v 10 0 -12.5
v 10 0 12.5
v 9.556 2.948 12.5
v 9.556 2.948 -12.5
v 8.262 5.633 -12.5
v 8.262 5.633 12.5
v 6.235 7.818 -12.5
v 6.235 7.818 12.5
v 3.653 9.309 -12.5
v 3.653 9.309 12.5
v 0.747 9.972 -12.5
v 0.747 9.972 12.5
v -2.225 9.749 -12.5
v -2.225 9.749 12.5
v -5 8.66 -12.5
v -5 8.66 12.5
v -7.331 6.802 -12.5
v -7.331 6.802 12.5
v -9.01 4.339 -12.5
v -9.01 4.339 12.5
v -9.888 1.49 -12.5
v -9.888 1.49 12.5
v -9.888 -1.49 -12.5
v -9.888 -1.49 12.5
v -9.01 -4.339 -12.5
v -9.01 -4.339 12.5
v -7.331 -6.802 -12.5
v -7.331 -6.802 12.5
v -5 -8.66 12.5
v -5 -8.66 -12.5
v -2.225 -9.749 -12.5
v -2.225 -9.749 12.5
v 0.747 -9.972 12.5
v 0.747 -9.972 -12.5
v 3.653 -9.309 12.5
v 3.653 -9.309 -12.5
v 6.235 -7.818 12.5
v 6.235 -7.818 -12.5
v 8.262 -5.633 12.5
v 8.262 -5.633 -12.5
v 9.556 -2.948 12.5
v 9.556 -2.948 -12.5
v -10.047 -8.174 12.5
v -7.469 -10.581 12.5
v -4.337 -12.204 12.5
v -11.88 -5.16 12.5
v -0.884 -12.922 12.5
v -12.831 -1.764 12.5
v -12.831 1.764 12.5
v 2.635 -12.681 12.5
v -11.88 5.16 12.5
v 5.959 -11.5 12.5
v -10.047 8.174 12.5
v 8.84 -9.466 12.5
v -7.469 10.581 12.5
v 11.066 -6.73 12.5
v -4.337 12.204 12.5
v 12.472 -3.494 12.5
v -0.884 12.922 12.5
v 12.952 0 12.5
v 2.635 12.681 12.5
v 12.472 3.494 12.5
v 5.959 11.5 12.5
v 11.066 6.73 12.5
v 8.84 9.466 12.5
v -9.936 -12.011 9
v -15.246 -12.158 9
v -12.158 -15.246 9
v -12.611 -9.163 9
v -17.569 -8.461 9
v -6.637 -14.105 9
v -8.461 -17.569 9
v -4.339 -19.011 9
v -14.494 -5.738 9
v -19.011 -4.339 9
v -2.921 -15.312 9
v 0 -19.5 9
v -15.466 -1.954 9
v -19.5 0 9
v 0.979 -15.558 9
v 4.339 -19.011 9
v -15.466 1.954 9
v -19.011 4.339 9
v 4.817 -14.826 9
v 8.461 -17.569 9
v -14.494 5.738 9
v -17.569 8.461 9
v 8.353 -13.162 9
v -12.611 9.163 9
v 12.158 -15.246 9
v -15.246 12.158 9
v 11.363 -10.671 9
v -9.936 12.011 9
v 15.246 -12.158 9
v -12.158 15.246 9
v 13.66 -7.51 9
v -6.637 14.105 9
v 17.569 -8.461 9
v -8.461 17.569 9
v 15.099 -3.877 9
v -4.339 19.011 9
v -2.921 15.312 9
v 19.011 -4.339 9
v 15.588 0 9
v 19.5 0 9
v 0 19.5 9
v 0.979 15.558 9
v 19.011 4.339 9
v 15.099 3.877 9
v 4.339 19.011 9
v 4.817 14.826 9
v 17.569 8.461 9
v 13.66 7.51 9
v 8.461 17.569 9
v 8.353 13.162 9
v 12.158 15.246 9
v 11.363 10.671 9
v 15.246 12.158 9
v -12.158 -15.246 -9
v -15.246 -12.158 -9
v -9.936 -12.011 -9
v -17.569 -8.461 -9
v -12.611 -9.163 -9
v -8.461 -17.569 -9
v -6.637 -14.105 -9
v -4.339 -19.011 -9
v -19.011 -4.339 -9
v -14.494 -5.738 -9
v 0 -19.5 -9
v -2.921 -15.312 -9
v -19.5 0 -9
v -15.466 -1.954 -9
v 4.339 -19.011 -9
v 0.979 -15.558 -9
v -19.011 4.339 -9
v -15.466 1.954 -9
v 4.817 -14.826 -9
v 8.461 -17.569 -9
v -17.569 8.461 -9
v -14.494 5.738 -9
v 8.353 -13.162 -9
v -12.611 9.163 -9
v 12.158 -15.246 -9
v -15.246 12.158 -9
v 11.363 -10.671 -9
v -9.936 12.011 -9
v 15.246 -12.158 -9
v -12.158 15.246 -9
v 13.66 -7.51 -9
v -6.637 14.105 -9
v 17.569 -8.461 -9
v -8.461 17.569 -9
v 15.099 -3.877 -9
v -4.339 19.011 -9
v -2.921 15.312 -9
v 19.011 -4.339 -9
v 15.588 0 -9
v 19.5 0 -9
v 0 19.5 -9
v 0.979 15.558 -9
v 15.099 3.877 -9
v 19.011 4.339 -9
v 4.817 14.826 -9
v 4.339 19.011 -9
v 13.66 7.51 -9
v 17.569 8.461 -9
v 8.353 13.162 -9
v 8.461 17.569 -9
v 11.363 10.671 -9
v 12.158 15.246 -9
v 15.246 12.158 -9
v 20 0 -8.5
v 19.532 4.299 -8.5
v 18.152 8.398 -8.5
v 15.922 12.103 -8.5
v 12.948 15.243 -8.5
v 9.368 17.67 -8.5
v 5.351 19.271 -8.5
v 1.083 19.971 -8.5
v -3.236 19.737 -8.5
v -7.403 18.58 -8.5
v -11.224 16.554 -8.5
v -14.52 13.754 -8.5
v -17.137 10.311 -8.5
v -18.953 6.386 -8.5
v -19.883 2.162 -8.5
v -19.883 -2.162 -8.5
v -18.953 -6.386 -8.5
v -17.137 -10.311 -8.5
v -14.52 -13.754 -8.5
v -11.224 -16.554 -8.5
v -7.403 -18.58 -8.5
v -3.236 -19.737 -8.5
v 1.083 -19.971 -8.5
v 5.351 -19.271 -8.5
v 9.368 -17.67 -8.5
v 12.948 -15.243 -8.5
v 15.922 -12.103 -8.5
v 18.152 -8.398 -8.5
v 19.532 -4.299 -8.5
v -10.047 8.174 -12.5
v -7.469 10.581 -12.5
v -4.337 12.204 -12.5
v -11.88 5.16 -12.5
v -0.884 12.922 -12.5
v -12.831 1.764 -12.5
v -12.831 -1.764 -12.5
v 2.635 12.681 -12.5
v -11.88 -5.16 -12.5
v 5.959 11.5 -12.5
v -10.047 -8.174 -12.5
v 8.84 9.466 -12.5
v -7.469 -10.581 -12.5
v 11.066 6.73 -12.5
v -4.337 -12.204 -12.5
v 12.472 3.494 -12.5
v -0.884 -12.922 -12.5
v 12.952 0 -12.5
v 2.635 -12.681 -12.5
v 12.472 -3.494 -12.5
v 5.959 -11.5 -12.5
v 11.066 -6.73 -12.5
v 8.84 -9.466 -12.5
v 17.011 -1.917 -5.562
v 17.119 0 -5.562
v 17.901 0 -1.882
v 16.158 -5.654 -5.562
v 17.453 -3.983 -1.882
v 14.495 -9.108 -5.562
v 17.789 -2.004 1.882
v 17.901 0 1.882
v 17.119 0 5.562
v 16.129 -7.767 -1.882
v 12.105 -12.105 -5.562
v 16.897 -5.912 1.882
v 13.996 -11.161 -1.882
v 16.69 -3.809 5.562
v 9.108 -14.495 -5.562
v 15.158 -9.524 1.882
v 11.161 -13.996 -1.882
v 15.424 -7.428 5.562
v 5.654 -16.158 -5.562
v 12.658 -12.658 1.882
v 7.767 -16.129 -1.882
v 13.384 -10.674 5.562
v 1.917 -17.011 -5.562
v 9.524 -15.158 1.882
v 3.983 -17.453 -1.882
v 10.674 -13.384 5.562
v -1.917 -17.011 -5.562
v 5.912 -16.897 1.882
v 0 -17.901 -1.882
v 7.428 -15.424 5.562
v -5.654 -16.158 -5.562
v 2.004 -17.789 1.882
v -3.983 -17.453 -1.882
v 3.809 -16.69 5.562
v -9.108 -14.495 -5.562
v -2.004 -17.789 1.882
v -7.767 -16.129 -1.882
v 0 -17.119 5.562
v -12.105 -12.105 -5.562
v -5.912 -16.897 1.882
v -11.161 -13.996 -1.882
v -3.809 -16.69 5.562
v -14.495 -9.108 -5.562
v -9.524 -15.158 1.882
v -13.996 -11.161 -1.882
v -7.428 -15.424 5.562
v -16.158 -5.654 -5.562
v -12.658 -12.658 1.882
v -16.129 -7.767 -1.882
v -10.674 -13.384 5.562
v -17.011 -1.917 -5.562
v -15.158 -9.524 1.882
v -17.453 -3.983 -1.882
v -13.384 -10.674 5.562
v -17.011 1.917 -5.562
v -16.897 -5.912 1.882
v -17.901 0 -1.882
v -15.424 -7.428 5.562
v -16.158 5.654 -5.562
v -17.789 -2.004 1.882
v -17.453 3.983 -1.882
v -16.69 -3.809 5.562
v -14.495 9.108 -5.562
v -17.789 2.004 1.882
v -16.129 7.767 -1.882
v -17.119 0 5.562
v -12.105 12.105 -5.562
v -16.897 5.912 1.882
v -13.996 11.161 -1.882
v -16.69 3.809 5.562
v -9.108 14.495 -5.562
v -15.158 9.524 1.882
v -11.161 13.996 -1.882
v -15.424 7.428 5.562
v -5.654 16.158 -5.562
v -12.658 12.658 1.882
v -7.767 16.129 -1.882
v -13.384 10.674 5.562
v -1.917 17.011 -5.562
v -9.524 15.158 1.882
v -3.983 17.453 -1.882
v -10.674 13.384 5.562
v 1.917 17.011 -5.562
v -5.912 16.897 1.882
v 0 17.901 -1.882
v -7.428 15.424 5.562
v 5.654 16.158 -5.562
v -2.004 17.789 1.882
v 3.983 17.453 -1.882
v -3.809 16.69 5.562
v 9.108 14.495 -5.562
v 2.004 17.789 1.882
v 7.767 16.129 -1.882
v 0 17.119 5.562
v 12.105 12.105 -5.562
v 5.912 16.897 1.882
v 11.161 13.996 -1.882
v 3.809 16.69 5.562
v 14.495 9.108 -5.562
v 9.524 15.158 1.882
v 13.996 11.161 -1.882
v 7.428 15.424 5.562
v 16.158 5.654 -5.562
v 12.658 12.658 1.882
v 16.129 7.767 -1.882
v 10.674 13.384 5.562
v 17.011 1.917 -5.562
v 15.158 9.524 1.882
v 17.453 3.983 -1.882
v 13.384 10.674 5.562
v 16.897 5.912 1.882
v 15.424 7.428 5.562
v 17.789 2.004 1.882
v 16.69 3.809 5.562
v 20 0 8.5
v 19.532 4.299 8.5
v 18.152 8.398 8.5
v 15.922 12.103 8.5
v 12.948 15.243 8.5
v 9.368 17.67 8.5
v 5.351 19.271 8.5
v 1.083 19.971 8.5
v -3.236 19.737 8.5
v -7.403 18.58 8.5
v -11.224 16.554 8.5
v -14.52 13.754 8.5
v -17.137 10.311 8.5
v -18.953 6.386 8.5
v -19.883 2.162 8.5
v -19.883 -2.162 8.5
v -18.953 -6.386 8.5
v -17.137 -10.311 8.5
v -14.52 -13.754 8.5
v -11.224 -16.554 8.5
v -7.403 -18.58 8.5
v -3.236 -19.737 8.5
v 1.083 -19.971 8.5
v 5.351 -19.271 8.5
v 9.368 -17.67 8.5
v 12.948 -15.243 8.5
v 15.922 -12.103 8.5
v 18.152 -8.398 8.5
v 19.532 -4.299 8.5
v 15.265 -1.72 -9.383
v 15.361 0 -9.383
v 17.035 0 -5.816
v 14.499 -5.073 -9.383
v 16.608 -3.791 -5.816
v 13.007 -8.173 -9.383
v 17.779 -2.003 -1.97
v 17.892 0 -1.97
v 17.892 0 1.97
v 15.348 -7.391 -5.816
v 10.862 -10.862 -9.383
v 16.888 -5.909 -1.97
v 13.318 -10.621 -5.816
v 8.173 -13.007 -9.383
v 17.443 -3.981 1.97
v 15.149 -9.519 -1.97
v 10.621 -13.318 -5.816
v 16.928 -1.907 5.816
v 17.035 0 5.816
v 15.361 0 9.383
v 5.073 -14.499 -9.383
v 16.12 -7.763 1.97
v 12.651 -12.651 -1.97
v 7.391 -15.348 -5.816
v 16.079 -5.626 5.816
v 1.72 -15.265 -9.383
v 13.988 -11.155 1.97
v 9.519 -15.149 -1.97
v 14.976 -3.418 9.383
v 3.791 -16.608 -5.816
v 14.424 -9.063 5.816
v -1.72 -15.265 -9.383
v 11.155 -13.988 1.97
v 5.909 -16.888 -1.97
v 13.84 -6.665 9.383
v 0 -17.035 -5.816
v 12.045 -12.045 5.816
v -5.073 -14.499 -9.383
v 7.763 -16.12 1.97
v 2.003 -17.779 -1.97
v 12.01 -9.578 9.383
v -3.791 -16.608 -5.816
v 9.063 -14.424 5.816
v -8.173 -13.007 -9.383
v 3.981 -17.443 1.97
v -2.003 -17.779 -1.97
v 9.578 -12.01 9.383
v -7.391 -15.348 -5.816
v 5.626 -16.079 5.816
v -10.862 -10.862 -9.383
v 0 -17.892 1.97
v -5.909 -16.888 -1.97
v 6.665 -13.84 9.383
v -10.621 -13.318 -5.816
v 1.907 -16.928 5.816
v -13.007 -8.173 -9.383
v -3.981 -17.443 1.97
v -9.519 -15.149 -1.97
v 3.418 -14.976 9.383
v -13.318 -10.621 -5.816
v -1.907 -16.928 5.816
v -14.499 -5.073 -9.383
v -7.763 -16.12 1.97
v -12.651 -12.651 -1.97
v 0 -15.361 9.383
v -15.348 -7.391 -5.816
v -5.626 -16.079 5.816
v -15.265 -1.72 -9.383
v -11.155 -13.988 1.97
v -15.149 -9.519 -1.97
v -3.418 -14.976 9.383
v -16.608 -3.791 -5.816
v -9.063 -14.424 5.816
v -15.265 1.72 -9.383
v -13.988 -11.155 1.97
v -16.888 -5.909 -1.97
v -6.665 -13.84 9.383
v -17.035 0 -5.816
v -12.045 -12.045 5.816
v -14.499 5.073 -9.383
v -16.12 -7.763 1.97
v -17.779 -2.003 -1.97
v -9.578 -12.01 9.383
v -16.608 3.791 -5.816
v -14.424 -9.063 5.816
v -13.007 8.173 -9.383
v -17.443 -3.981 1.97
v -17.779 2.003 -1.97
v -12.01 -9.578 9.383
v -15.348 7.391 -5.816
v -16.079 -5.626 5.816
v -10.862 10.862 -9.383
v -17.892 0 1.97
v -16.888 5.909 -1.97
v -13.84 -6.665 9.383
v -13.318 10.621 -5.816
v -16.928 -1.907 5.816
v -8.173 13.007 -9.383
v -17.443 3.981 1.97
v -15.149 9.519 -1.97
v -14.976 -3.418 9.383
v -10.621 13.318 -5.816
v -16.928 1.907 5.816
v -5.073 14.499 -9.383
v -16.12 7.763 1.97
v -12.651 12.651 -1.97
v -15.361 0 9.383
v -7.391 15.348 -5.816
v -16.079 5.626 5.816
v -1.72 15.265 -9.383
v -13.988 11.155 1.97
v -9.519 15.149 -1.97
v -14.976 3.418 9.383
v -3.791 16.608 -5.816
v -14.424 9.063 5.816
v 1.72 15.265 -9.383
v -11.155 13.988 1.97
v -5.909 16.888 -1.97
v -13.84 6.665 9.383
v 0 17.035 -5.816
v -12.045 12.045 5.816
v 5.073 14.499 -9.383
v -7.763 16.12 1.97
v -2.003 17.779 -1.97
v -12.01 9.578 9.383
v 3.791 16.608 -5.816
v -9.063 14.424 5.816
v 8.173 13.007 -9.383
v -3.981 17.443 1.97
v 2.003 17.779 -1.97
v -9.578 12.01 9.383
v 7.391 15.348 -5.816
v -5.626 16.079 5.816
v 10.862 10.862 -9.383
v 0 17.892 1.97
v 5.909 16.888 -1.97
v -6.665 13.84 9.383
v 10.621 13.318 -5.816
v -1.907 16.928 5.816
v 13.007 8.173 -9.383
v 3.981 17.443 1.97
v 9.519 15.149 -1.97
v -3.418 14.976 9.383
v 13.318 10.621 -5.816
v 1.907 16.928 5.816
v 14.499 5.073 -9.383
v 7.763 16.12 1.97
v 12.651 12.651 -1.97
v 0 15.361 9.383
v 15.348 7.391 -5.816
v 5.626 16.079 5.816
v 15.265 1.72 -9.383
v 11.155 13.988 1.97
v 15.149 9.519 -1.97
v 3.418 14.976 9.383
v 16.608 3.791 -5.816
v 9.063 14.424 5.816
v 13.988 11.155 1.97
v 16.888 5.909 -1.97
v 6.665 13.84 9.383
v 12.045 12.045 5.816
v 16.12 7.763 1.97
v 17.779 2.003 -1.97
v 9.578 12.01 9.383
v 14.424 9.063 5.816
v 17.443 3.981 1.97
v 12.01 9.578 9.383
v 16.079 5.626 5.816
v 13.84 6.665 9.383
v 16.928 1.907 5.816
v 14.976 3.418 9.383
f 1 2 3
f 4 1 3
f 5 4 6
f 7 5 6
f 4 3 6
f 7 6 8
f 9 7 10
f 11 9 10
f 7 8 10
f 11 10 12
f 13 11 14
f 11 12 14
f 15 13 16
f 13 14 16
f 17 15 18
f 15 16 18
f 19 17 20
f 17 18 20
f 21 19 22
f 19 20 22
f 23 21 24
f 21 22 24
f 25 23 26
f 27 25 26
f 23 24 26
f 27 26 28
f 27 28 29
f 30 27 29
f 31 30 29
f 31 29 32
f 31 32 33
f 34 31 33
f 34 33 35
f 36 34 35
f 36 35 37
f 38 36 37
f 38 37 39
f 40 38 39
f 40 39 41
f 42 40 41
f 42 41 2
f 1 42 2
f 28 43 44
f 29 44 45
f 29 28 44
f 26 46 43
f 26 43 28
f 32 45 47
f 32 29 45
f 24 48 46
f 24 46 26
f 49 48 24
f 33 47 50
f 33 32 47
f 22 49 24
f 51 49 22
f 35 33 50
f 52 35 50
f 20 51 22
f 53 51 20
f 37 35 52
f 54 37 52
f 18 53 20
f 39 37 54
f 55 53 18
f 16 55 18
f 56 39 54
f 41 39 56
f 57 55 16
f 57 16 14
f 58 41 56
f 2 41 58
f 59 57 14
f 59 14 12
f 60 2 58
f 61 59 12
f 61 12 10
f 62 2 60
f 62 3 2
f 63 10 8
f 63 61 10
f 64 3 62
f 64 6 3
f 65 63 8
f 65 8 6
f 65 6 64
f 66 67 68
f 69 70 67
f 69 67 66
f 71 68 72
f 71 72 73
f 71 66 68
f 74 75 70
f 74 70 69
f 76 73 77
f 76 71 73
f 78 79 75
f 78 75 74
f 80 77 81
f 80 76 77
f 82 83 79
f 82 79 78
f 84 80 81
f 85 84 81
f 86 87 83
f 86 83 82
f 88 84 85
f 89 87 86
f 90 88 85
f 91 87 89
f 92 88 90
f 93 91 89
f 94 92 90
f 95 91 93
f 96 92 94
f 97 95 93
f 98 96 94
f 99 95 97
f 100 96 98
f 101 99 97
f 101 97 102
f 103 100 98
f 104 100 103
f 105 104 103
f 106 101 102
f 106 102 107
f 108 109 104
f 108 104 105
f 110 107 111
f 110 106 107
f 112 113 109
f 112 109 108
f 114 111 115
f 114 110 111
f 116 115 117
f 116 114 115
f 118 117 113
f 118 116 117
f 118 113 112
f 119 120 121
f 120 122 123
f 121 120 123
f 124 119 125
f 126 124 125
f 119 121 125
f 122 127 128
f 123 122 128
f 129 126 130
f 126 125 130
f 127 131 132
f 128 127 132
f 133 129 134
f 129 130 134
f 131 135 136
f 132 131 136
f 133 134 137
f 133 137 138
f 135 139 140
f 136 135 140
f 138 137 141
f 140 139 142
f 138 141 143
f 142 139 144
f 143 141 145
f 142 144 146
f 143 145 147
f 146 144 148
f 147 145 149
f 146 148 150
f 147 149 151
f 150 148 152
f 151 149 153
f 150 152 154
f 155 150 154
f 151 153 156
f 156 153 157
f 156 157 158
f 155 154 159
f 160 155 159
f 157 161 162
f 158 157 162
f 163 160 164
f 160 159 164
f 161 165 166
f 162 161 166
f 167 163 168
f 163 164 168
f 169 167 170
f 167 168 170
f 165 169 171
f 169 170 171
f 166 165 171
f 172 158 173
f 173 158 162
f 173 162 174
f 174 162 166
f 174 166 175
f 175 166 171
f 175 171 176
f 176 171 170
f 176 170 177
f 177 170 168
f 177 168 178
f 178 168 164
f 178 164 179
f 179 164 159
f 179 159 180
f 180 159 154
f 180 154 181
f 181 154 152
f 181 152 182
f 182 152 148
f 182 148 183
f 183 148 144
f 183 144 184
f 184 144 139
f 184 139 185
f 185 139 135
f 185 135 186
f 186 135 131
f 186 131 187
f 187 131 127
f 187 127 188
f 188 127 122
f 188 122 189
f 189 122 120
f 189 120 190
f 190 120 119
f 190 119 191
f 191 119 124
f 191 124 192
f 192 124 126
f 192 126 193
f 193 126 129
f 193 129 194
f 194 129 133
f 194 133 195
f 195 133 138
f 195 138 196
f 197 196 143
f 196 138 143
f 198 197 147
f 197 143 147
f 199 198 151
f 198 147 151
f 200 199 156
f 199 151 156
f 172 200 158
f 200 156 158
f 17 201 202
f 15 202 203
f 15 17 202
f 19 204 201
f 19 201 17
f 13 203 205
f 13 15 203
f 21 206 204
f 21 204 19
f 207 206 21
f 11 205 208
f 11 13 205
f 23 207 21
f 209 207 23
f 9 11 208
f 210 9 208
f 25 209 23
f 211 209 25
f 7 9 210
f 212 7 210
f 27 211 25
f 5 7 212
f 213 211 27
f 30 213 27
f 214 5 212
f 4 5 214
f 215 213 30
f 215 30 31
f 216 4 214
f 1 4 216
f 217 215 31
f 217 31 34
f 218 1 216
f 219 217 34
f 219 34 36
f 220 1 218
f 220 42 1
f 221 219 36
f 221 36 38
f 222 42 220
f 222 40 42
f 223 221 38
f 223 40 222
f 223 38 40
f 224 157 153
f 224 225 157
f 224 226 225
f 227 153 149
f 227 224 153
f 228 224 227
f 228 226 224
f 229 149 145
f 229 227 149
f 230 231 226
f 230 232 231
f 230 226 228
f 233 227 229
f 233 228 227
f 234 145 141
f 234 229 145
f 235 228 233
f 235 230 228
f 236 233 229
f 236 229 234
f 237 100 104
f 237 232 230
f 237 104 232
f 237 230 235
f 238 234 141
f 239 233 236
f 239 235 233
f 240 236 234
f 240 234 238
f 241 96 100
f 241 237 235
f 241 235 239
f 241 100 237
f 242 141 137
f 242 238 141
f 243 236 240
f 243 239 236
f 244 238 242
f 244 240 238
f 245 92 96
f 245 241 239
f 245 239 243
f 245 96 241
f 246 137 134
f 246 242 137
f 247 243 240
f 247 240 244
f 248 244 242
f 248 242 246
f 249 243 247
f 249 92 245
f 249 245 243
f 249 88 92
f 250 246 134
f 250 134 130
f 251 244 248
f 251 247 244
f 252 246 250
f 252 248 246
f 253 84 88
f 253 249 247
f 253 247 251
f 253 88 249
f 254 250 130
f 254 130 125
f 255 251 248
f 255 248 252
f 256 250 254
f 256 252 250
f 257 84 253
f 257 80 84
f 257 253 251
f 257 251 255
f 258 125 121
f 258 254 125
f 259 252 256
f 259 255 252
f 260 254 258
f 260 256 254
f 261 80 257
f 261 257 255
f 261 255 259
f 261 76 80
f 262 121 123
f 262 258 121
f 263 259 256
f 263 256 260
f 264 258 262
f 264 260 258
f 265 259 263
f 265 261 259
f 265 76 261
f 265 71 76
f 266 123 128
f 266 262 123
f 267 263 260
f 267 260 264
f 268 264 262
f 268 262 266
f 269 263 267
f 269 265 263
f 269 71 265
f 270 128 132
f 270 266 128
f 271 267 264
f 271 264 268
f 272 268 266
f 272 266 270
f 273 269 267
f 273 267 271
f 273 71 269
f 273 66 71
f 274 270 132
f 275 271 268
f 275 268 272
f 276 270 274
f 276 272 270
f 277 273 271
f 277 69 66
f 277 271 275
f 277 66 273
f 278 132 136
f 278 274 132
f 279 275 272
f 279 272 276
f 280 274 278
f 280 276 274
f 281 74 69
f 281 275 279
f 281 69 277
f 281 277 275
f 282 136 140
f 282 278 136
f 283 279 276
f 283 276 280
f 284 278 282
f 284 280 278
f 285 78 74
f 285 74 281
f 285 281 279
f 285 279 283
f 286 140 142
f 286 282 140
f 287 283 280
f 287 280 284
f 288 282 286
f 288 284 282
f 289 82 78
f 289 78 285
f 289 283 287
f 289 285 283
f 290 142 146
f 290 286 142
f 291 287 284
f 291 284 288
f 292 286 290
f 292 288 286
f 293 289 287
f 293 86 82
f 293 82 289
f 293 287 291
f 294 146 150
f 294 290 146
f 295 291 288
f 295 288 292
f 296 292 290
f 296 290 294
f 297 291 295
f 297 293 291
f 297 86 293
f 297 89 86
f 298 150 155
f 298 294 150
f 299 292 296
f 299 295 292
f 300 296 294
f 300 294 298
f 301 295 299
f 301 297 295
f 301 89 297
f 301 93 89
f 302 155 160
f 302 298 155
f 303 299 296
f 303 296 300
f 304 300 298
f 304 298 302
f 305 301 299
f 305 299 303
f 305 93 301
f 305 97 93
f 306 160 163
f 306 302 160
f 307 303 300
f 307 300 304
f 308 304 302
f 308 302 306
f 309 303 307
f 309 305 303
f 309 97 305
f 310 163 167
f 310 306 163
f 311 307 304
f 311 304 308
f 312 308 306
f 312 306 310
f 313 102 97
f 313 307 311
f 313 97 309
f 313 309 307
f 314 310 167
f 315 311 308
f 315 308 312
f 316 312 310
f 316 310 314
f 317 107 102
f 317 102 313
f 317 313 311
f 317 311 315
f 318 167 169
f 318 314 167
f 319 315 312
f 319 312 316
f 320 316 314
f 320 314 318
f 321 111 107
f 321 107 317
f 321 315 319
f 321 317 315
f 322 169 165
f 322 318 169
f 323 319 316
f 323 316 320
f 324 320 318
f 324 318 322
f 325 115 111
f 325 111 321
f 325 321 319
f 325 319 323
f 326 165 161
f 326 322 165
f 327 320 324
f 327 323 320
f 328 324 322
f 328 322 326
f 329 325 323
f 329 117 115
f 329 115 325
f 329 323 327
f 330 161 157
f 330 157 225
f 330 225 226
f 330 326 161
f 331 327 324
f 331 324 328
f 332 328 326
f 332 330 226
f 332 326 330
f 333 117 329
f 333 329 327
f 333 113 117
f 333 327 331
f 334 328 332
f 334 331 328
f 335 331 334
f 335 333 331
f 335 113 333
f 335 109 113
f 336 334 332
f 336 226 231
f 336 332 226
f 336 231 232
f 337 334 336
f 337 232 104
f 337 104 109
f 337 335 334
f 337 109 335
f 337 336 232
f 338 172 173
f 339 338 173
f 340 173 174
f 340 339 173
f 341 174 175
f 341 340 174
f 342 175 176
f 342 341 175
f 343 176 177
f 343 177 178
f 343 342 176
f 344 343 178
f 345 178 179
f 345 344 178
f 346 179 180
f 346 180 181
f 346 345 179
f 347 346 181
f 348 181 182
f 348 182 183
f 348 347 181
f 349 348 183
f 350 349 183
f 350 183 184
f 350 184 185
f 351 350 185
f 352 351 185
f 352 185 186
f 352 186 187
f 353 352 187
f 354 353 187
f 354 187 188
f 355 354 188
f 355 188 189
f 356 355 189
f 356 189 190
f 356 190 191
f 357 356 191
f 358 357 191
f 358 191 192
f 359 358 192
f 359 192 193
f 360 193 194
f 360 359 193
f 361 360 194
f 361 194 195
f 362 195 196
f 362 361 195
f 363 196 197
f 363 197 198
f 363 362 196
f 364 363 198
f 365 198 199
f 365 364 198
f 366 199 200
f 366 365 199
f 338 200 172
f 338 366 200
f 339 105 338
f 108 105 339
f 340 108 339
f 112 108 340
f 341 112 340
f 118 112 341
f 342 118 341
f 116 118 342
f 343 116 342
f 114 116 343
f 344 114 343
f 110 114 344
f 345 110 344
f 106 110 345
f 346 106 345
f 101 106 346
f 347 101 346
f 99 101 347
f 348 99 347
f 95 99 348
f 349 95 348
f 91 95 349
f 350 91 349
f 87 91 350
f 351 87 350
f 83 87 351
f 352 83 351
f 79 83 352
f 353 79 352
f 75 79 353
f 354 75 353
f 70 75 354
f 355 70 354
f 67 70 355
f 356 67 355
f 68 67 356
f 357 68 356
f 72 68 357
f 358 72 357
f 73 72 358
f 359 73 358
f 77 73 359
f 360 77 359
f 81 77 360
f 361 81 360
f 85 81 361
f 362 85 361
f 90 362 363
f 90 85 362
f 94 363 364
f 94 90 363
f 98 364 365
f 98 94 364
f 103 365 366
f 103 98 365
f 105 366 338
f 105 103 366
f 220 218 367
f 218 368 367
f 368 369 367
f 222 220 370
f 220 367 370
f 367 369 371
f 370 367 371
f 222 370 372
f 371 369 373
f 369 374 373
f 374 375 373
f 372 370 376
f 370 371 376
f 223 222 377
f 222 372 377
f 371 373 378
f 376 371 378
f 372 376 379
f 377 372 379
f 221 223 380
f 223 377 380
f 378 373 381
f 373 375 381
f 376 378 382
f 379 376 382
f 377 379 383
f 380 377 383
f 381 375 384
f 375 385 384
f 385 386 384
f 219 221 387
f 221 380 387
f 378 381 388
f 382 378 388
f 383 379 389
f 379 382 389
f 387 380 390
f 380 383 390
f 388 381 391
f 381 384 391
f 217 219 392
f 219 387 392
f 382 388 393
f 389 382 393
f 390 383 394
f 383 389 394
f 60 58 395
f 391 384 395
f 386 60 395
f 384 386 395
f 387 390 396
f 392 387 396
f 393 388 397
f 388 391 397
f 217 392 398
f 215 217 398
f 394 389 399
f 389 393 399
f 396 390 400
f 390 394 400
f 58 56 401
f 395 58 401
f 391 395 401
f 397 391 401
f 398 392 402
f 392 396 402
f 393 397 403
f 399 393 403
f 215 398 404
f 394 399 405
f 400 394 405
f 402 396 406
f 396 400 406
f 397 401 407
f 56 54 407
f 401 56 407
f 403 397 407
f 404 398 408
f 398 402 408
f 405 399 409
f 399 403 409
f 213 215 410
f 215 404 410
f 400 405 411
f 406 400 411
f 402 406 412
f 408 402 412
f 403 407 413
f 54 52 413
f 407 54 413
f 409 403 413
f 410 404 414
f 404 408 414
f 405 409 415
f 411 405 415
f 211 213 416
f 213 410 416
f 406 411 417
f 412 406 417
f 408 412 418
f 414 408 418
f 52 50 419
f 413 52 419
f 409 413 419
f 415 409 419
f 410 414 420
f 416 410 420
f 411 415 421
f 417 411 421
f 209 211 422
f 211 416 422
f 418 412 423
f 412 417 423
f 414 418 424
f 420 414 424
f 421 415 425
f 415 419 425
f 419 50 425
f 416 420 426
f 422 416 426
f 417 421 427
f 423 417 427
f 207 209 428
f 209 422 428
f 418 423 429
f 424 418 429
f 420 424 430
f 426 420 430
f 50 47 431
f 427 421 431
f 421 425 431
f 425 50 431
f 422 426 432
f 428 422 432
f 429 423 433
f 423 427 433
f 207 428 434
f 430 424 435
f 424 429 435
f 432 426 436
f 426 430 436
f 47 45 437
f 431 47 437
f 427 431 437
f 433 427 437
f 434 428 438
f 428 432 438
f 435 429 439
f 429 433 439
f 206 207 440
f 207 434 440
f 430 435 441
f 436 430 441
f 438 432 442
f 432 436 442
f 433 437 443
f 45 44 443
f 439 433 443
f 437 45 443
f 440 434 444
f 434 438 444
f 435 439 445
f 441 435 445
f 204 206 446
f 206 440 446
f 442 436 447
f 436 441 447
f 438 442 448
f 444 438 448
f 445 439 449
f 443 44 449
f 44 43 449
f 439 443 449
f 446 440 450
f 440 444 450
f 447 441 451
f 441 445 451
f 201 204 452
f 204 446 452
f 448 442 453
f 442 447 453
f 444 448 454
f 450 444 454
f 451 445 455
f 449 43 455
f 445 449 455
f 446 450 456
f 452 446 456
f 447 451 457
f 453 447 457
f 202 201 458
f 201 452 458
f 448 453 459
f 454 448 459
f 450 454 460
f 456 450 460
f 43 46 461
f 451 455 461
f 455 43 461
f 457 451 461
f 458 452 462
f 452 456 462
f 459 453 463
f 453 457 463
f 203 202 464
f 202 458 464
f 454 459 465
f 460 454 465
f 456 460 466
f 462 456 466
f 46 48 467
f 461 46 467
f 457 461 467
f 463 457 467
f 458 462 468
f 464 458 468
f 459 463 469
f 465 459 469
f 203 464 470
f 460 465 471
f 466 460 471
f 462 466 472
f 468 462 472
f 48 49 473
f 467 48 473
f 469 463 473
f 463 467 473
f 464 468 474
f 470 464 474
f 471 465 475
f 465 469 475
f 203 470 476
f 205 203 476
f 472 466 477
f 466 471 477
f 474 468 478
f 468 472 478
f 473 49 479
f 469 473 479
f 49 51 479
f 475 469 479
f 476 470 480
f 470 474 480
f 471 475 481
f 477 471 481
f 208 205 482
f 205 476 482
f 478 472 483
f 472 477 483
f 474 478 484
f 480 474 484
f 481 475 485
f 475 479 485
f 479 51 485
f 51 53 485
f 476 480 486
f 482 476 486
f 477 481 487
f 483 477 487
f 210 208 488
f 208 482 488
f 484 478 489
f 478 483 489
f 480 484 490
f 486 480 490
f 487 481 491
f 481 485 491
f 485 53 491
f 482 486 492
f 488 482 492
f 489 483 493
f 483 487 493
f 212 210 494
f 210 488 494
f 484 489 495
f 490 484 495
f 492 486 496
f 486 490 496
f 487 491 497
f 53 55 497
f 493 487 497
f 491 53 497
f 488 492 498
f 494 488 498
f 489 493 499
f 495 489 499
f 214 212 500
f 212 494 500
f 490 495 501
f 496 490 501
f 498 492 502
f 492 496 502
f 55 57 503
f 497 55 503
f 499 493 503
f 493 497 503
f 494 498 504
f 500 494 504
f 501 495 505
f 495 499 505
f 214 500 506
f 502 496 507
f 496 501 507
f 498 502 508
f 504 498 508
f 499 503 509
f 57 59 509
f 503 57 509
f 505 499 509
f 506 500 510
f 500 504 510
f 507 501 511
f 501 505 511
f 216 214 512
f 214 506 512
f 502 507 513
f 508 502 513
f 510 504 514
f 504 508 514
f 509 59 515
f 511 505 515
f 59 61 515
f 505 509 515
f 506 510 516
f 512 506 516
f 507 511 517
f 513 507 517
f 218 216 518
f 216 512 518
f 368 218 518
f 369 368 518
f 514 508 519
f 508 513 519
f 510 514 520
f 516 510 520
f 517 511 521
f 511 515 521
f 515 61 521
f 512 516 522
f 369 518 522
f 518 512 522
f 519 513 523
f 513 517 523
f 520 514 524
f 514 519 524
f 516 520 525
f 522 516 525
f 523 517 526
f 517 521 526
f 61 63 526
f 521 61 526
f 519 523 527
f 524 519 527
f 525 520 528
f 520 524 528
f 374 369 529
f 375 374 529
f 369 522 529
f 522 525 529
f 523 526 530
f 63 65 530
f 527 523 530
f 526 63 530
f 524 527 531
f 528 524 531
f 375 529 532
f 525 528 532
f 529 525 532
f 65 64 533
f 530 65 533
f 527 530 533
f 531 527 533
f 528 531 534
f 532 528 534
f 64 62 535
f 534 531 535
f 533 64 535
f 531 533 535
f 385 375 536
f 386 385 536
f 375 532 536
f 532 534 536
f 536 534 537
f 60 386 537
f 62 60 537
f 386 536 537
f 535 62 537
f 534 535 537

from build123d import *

# Parameters (mm, degrees)
F0_R          = 20
F1_DEPTH      = 9
F5_W          = 61.494613611
F5_H          = 42.5213627827
F5_W_2        = 50.2453296907
F5_H_2        = 22.91888696
F6_DEPTH      = 20.001
F6_DEPTH_BACK = 20.001
F7_R          = 10
F8_DEPTH      = 25.001
F9_SIZE       = 0.5


with BuildPart() as f1:
    # F0 (on Top) → F1 (new body, symmetric)
    with BuildSketch(Plane.XY):
        Circle(F0_R)
    extrude(amount=F1_DEPTH, both=True)

    # F2 (on Front) → F3 (revolve, cut)
    with BuildSketch(Plane.XZ):
        with BuildLine():
            Line((0, 18), (0, -18))
            ThreePointArc((0, -18), (18, 0), (0, 18))
        make_face()
    revolve(axis=Axis((0, 0, -3.5514803869), (0, 0, -1)), mode=Mode.SUBTRACT)

    # F9
    f9_edges = [f1.edges().sort_by_distance(p)[0] for p in [
        (-20, 0, 9),
        (-20, 0, -9),
    ]]
    chamfer(f9_edges, length=F9_SIZE)


with BuildPart() as f4:
    # F2 (on Front) → F4 (revolve)
    with BuildSketch(Plane.XZ):
        with BuildLine():
            Line((0, 18), (0, -18))
            ThreePointArc((0, -18), (18, 0), (0, 18))
        make_face()
    revolve(axis=Axis((0, 0, -3.5514803869), (0, 0, -1)))

    # F5 (on Front) → F6 (cut, two sides)
    with BuildSketch(Plane.XZ) as f6_sk:
        with Locations((0, -33.7606813913)):
            Rectangle(F5_W, F5_H)
        with Locations((0, 23.95944348)):
            Rectangle(F5_W_2, F5_H_2)
    extrude(amount=-F6_DEPTH, mode=Mode.SUBTRACT)
    extrude(f6_sk.sketch, amount=F6_DEPTH_BACK, mode=Mode.SUBTRACT)

    # F7 (on face) → F8 (cut, through all)
    with BuildSketch(Plane.XY.offset(12.5)):
        Circle(F7_R)
    extrude(amount=-F8_DEPTH, mode=Mode.SUBTRACT)


solid = Compound([f1.part, f4.part])
